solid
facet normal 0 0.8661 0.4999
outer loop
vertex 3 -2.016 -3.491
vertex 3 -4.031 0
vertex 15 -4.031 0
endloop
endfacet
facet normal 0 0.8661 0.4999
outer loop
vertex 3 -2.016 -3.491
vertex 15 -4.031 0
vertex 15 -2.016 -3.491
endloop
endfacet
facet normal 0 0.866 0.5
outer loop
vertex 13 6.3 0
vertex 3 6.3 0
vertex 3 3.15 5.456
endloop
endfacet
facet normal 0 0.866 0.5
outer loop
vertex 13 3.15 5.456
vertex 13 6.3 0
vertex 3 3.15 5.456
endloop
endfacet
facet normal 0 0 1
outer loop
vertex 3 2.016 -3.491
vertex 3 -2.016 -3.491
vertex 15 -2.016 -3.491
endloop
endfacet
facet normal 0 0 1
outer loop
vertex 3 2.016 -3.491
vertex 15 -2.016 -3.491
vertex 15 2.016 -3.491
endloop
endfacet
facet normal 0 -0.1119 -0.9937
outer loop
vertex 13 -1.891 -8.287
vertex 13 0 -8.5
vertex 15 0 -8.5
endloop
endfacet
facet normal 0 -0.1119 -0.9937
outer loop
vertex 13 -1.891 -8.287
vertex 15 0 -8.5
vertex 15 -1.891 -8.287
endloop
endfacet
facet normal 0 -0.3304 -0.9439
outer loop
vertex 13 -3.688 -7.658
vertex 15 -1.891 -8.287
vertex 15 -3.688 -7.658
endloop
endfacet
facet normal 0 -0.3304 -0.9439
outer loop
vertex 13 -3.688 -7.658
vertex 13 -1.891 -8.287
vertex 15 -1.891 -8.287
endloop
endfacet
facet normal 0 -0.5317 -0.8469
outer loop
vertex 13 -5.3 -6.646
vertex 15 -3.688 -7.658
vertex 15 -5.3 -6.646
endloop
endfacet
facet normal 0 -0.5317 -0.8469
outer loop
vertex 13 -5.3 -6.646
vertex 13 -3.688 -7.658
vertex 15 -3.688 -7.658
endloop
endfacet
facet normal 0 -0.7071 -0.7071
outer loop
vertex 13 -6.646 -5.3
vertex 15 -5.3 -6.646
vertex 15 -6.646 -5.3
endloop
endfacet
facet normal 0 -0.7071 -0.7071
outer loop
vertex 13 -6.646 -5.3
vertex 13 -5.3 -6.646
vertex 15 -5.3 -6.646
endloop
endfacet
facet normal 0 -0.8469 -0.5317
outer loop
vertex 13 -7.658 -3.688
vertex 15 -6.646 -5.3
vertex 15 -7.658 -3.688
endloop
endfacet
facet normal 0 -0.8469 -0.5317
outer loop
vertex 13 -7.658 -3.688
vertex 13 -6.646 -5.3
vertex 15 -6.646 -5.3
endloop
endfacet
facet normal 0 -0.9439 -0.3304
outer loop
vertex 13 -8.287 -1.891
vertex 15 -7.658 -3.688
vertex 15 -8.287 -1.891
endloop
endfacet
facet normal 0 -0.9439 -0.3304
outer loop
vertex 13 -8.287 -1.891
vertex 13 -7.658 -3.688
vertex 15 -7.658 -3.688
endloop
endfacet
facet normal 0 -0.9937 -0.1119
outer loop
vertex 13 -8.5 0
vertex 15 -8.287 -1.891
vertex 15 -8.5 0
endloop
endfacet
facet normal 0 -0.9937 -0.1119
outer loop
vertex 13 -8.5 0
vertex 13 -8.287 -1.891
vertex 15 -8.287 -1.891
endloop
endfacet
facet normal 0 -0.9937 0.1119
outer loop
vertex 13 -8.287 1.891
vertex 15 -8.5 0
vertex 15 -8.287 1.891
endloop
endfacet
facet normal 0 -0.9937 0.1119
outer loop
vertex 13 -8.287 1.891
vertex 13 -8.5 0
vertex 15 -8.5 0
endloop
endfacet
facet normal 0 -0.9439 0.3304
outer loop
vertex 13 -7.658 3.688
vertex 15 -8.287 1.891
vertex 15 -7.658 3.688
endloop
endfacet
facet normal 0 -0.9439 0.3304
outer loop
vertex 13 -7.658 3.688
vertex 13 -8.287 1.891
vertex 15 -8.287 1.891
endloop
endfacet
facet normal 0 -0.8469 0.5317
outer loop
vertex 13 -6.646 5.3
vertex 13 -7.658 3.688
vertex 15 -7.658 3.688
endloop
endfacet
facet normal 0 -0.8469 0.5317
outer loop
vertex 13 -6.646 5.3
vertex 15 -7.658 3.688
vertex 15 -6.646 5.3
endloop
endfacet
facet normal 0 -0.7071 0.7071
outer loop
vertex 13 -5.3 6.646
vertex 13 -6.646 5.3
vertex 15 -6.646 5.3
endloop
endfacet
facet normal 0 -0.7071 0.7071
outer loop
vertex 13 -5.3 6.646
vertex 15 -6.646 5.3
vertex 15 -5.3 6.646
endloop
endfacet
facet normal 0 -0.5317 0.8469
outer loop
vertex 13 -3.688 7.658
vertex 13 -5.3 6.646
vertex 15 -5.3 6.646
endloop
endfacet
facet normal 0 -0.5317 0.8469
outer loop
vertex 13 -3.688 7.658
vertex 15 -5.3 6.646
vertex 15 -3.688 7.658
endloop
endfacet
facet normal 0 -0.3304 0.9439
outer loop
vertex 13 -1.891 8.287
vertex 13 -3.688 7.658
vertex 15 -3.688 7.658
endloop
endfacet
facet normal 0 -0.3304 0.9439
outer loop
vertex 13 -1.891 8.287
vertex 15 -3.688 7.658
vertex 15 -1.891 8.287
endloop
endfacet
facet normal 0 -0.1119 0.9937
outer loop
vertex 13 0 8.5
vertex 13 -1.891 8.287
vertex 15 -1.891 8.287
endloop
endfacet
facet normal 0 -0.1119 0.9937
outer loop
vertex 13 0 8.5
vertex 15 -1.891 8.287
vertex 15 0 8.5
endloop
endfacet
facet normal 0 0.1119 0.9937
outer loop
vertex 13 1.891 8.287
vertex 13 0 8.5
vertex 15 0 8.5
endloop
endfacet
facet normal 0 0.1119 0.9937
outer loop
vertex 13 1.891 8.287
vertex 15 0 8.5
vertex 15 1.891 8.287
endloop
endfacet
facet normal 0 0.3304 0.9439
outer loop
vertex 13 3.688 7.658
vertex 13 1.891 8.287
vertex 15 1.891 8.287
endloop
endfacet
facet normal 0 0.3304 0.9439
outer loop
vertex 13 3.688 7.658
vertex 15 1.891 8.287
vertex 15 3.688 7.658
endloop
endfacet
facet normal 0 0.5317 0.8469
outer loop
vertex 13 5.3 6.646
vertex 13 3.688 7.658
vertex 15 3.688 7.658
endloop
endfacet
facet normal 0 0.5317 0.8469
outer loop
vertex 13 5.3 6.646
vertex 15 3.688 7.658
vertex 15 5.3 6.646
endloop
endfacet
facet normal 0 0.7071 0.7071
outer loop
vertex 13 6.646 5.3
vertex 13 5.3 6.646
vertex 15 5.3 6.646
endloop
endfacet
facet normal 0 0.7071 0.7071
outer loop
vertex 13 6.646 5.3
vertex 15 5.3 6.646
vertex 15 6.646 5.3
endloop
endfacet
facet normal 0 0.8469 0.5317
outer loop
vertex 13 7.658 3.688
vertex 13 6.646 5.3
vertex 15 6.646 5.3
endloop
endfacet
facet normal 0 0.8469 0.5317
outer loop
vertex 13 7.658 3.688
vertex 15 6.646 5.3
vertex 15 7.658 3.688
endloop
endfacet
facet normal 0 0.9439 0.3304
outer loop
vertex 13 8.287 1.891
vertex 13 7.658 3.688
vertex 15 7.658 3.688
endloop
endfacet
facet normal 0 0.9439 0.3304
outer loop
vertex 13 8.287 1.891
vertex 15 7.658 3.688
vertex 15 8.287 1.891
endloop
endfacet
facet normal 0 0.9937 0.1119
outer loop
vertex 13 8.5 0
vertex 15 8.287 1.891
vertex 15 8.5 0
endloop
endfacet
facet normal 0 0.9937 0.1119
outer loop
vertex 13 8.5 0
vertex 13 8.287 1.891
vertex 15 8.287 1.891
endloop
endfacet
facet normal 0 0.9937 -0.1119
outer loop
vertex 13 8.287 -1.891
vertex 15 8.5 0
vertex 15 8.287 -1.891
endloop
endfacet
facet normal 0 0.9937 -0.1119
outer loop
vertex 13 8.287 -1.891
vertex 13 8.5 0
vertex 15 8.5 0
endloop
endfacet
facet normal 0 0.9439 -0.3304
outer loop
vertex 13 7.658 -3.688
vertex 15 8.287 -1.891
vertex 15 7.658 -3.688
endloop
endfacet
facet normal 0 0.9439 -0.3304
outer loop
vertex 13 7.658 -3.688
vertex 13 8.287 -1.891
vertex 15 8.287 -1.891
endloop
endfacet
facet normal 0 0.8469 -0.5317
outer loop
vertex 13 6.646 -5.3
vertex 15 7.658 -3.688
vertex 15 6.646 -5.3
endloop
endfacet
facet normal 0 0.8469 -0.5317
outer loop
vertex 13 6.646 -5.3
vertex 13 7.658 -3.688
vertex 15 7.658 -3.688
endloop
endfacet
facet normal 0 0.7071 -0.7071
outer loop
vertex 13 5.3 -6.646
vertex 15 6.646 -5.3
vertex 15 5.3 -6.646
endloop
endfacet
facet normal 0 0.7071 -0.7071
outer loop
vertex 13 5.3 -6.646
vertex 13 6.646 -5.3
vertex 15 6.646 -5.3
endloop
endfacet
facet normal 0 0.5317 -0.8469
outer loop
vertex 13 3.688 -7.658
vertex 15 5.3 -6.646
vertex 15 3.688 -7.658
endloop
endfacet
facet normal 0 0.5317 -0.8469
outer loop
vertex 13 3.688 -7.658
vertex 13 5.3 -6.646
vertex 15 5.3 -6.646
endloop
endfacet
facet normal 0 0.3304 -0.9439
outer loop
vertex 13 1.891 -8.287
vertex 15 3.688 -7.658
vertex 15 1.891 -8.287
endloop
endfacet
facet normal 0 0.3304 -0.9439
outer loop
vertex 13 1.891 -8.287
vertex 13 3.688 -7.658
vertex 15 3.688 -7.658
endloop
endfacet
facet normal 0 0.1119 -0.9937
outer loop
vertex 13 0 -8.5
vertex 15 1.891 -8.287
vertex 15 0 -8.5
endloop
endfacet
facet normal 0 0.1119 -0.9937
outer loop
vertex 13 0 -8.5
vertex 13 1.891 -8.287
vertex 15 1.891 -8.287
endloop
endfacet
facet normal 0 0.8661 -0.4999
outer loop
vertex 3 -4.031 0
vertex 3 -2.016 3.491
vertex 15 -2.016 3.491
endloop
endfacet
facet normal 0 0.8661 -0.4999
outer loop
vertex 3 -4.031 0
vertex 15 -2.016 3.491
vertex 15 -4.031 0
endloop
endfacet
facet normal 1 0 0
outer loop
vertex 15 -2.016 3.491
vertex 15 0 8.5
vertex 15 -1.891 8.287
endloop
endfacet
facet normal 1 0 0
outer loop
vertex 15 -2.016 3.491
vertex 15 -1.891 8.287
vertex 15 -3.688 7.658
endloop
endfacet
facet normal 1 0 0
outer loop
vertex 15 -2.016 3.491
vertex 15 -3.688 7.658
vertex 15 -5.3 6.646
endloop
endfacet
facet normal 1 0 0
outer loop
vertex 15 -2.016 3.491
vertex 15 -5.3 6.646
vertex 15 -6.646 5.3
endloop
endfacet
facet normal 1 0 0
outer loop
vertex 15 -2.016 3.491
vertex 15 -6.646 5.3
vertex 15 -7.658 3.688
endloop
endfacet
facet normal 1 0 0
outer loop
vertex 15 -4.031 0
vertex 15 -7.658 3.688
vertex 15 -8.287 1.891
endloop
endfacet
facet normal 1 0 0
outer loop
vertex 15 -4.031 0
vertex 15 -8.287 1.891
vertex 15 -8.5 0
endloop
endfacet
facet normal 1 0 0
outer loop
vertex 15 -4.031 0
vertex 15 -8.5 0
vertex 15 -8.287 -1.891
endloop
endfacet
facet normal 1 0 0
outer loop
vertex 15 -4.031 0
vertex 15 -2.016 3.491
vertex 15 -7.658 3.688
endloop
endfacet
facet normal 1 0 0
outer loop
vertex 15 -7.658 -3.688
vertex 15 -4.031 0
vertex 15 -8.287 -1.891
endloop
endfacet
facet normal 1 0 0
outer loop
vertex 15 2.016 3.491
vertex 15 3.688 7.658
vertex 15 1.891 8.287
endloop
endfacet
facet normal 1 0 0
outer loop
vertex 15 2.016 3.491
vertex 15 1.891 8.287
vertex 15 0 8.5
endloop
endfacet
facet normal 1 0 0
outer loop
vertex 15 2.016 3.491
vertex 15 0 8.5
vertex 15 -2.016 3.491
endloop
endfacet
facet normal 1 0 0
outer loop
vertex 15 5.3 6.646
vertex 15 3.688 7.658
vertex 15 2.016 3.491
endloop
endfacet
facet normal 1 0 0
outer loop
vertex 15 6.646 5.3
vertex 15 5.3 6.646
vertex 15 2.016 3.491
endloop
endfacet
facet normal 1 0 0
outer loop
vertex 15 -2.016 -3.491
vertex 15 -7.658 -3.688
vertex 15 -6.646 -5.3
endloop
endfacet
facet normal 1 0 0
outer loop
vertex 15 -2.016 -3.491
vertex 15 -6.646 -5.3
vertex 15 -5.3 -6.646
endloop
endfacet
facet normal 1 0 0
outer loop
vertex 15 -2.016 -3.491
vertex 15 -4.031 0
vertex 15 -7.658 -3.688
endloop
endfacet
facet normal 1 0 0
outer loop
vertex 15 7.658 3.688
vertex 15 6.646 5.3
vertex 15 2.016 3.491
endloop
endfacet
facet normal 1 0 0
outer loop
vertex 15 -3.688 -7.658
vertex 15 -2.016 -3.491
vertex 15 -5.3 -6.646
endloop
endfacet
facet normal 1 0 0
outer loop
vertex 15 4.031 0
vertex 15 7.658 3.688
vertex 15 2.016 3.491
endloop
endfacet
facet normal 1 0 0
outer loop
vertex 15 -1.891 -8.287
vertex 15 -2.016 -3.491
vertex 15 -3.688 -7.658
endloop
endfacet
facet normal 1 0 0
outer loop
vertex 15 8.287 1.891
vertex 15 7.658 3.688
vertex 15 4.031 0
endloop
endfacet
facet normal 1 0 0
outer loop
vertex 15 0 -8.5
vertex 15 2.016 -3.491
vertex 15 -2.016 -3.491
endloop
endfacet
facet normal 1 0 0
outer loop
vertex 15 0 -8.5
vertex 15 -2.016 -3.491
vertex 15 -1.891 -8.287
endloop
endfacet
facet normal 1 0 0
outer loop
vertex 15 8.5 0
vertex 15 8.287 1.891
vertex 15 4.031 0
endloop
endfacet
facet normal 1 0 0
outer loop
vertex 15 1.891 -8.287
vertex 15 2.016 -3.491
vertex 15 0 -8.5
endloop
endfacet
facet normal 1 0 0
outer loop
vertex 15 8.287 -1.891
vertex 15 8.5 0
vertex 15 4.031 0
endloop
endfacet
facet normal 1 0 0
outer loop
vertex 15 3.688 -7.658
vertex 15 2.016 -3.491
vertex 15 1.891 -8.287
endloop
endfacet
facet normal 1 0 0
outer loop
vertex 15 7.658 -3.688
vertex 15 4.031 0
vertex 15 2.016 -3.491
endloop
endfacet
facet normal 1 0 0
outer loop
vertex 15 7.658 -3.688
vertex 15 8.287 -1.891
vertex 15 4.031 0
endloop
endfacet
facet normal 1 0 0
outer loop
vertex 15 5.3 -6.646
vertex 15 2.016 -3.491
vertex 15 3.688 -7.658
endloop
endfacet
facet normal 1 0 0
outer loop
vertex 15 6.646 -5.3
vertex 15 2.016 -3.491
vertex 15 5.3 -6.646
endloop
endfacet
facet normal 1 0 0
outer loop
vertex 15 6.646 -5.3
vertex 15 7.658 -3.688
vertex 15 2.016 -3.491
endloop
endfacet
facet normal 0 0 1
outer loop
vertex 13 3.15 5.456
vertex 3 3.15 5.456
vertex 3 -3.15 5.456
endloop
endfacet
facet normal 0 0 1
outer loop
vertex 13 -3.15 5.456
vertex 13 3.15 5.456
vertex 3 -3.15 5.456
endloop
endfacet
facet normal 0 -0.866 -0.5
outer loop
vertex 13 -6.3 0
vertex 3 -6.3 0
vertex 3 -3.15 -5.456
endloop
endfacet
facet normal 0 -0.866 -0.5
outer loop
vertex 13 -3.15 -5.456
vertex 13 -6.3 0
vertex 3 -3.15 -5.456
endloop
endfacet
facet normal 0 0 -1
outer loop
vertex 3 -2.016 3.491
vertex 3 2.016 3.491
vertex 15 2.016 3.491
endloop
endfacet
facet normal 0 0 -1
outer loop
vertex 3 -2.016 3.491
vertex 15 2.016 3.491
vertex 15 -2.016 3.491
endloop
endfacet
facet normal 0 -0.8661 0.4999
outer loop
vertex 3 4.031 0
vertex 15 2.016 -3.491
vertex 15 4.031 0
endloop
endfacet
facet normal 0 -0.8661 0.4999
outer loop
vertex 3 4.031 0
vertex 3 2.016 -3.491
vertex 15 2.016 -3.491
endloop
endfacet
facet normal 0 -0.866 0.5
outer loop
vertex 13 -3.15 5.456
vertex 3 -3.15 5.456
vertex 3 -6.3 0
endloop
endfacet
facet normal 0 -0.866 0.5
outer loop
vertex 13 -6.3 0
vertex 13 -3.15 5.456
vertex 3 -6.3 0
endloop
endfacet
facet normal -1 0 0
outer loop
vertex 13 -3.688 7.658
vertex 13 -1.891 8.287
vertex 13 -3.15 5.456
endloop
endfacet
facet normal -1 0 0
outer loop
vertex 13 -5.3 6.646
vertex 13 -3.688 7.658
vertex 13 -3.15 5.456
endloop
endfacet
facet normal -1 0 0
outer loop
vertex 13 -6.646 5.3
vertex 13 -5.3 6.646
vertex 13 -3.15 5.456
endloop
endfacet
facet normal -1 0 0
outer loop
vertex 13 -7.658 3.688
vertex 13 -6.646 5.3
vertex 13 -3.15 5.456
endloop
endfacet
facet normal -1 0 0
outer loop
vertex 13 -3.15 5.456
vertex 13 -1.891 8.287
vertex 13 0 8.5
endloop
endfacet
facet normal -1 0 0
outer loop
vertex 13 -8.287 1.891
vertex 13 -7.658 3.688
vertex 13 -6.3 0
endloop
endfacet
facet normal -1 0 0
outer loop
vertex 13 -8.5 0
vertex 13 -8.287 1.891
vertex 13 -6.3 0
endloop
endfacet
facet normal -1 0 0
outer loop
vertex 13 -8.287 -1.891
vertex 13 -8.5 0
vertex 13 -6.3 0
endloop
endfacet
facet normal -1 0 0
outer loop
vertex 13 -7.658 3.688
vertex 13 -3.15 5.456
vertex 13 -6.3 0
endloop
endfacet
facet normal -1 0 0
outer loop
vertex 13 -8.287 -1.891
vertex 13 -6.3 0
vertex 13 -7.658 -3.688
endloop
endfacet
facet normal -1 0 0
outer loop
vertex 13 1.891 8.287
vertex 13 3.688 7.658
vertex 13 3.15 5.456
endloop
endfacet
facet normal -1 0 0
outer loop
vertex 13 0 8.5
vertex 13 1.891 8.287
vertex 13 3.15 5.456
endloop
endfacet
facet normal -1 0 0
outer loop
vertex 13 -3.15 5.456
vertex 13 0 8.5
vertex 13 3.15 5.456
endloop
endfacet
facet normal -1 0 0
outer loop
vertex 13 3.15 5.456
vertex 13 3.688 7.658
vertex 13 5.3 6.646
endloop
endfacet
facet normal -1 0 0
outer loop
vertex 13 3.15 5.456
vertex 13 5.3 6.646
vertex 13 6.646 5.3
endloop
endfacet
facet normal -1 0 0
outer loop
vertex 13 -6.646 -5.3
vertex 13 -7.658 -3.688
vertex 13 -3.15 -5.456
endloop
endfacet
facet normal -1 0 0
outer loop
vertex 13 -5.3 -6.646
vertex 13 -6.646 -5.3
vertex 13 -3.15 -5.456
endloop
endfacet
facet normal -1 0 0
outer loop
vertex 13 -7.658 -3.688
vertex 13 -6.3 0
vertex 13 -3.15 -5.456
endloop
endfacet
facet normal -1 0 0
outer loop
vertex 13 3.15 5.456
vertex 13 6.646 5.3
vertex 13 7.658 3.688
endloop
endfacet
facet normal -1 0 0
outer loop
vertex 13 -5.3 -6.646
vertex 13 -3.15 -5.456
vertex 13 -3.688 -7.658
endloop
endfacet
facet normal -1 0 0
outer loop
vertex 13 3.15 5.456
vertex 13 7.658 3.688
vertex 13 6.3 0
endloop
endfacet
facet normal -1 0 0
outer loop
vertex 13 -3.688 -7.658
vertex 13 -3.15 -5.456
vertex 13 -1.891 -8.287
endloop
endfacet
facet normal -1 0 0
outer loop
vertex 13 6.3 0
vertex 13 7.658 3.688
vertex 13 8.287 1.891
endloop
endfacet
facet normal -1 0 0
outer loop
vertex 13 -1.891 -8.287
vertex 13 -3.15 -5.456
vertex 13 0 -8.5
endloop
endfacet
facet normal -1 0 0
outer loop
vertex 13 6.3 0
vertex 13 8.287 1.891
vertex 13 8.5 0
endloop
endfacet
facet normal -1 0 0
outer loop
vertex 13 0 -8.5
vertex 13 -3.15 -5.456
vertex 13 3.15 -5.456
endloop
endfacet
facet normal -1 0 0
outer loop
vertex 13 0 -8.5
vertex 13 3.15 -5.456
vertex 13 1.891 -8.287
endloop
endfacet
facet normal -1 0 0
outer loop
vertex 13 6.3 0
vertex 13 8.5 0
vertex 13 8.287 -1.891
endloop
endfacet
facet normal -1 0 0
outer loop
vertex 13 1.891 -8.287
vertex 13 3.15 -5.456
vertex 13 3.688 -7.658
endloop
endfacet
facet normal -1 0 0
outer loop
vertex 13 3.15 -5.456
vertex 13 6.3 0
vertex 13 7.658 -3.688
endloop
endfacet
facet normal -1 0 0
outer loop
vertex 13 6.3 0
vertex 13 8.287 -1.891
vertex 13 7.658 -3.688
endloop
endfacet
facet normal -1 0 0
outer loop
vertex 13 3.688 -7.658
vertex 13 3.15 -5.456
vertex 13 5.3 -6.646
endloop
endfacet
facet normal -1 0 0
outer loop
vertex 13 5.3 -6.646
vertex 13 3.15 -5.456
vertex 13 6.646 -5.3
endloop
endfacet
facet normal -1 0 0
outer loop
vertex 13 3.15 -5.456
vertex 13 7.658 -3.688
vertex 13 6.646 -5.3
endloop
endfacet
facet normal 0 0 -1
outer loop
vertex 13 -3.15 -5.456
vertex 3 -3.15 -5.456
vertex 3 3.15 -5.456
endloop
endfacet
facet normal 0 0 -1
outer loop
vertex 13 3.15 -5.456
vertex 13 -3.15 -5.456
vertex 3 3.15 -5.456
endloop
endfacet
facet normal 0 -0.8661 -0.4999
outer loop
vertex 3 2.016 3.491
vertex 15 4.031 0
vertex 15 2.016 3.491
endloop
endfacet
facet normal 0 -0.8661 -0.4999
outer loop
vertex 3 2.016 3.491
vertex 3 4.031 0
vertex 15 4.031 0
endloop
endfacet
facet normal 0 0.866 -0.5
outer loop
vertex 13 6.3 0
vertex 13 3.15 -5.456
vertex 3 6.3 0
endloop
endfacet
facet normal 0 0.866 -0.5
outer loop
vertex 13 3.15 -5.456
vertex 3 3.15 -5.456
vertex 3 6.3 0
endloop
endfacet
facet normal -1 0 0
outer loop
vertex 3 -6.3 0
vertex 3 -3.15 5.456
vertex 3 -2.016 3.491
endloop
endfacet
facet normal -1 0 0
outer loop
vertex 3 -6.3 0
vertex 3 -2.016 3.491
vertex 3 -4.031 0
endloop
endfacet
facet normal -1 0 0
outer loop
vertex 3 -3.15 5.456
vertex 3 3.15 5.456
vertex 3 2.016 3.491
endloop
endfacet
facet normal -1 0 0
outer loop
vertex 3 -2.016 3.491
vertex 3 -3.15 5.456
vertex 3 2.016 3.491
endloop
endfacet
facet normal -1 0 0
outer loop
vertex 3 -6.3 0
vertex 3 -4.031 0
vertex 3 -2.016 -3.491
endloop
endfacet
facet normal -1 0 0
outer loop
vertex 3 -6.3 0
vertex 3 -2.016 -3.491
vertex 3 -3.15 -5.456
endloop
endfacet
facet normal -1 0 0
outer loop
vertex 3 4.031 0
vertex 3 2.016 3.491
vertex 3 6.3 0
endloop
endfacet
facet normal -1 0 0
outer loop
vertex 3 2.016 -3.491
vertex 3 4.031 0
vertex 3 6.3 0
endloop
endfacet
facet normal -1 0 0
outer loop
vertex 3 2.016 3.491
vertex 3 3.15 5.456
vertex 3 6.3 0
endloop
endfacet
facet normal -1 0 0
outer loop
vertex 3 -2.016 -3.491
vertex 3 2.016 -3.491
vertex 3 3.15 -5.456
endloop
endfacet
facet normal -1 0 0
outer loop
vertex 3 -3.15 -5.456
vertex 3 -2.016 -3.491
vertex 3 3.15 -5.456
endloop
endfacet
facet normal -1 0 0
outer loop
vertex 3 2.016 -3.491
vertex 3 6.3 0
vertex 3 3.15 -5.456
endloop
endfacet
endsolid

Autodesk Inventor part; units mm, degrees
ref_plane "YZ Plane" through (0, 0, 0) normal (1, 0, 0) x (0, 1, 0)
ref_plane "XZ Plane" through (0, 0, 0) normal (0, 1, 0) x (-1, 0, 0)
ref_plane "XY Plane" through (0, 0, 0) normal (0, 0, 1) x (1, 0, 0)
sketch "Sketch1" plane through (0, 0, 0) normal (1, 0, 0) x (0, 1, 0)
  line L0 (0, 0) -> (3, 0) construction
  line L1 (3, 0) -> (3, -15.0663) construction
  line L2 (3, -15.0663) -> (0, -15.0663) construction
  line L3 (0, -15.0663) -> (0, 0) construction
  line L4 (0, 0) -> (-3, 0) construction
  line L5 (-3, 0) -> (-3, -15.0663) construction
  line L6 (-3, -15.0663) -> (0, -15.0663) construction
  line L7 (0, -15.0663) -> (0, 0) construction
  line L8 (3, -5.1752) -> (-2.9818, -5.1857)
  line L9 (-2.9818, -5.1857) -> (-5.9818, -0.0105)
  line L10 (-5.9818, -0.0105) -> (-3, 5.1752)
  line L11 (-3, 5.1752) -> (2.9818, 5.1857)
  line L12 (2.9818, 5.1857) -> (5.9818, 0.0105)
  line L13 (5.9818, 0.0105) -> (3, -5.1752)
  dimension "d0" = 3
  dimension "d1" = 3
extrude "Extrusion1" add sketch "Sketch1" along normal blind 3
sketch "Sketch2" plane through (0, 0, 0) normal (-1, 0, 0) x (0, 0, 1)
  point P0 (0, 0)
sketch "Sketch3" plane through (0, 0, 0) normal (-1, 0, 0) x (0, 0, 1)
  line L0 (-5.1752, 3) -> (0.0105, 5.9818) projected
  circle A0 centre (0, 0) radius 5.9818
extrude "Extrusion2" add sketch "Sketch3" along normal blind 2
sketch "Sketch4" plane through (3, 0, 0) normal (1, 0, 0) x (0, 0, -1)
  line L0 (0, -4.0315) -> (-3.4914, -2.0157) construction
  line L1 (-3.4914, -2.0157) -> (-3.4914, 2.0157) construction
  line L2 (-3.4914, 2.0157) -> (0, 4.0315) construction
  line L3 (0, 4.0315) -> (3.4914, 2.0157) construction
  line L4 (3.4914, 2.0157) -> (3.4914, -2.0157) construction
  line L5 (3.4914, -2.0157) -> (0, -4.0315) construction
  point P0 (0, 0)
  point P1 (0, 0)
sketch "Sketch5" plane through (3, 0, 0) normal (1, 0, 0) x (0, 0, -1)
  line L0 (0, -4.0314) -> (-3.4913, -2.0157)
  line L1 (-3.4913, -2.0157) -> (-3.4913, 2.0157)
  line L2 (-3.4913, 2.0157) -> (0, 4.0314)
  line L3 (0, 4.0314) -> (3.4913, 2.0157)
  line L4 (3.4913, 2.0157) -> (3.4913, -2.0157)
  line L5 (3.4913, -2.0157) -> (0, -4.0314)
  point P0 (0, 0)
  point P1 (0, 0)
extrude "Extrusion3" cut sketch "Sketch5" against normal blind 10
sketch "Sketch6" plane through (3, 0, 0) normal (1, 0, 0) x (0, 0, -1)
  point P0 (0, 0)
sketch "Sketch7" plane through (3, 0, 0) normal (1, 0, 0) x (0, 0, -1)
  line L0 (3.75, -6.5332) -> (-3.7829, -6.5142) construction
  line L1 (-3.7829, -6.5142) -> (-7.5329, 0.019) construction
  line L2 (-7.5329, 0.019) -> (-3.75, 6.5332) construction
  line L3 (-3.75, 6.5332) -> (3.7829, 6.5142) construction
  line L4 (3.7829, 6.5142) -> (7.5329, -0.019) construction
  line L5 (7.5329, -0.019) -> (3.75, -6.5332) construction
  line L6 (3.75, -6.5332) -> (-3.7829, -6.5142)
  line L7 (-3.7829, -6.5142) -> (-7.5329, 0.019)
  line L8 (-7.5329, 0.019) -> (-3.75, 6.5332)
  line L9 (-3.75, 6.5332) -> (3.7829, 6.5142)
  line L10 (3.7829, 6.5142) -> (7.5329, -0.019)
  line L11 (7.5329, -0.019) -> (3.75, -6.5332)
  point P0 (0, 0)
  point P1 (0, 0)
  point P2 (0, 0)
extrude "Extrusion4" add sketch "Sketch7" along normal blind 10
sketch "Sketch8" plane through (13, 0, 0) normal (1, 0, 0) x (0, 0, -1)
  circle A0 centre (0, 0) radius 8.5
  dimension "d11" = 17
extrude "Extrusion5" add sketch "Sketch8" along normal blind 2
sketch "Sketch9" plane through (-2, 0, 0) normal (-1, 0, 0) x (0, 0, 1)
  line L0 (0, -4.0314) -> (-3.4913, -2.0157) projected
  line L1 (-3.4913, -2.0157) -> (-3.4913, 2.0157)
  line L2 (-3.4913, 2.0157) -> (0, 4.0314)
  line L3 (0, 4.0314) -> (3.4913, 2.0157)
  line L4 (3.4913, 2.0157) -> (3.4913, -2.0157)
  line L5 (3.4913, -2.0157) -> (0, -4.0314)
  line L6 (0, -4.0314) -> (-3.4913, -2.0157)
  point P0 (0, 0)
  point P1 (0, 0)
extrude "Extrusion6" cut sketch "Sketch9" against normal blind 17.25
sketch "Sketch10" plane through (-2, 0, 0) normal (-1, 0, 0) x (0, 0, 1)
  circle A0 centre (0, 0) radius 5.9818
extrude "Extrusion7" cut sketch "Sketch10" against normal blind 5
sketch "Sketch11" plane through (3, 0, 0) normal (-1, 0, 0) x (0, 0, 1)
  line L0 (0, 6.3) -> (4.998, 6.3) construction
  line L1 (4.998, 6.3) -> (4.998, -6.3) construction
  line L2 (4.998, -6.3) -> (0, -6.3) construction
  line L3 (0, -6.3) -> (0, 6.3) construction
  line L4 (7.5329, 0.019) -> (3.75, 6.5332) projected
  line L5 (3.75, 6.5332) -> (7.5329, 0.019)
  line L6 (7.5329, 0.019) -> (3.7829, -6.5142)
  line L7 (3.7829, -6.5142) -> (-3.75, -6.5332)
  line L8 (-3.75, -6.5332) -> (-7.5329, -0.019)
  line L9 (-7.5329, -0.019) -> (-3.7829, 6.5142)
  line L10 (-3.7829, 6.5142) -> (3.75, 6.5332)
  line L11 (0, 6.3) -> (5.456, 3.15)
  line L12 (5.456, 3.15) -> (5.456, -3.15)
  line L13 (5.456, -3.15) -> (0, -6.3)
  line L14 (0, -6.3) -> (-5.456, -3.15)
  line L15 (-5.456, -3.15) -> (-5.456, 3.15)
  line L16 (-5.456, 3.15) -> (0, 6.3)
  point P0 (0, 0)
  point P1 (0, 0)
  point P2 (0, 0)
  dimension "d18" = 12.6
extrude "Extrusion8" cut sketch "Sketch11" against normal blind 10
properties part number "OuterLayerHub"
